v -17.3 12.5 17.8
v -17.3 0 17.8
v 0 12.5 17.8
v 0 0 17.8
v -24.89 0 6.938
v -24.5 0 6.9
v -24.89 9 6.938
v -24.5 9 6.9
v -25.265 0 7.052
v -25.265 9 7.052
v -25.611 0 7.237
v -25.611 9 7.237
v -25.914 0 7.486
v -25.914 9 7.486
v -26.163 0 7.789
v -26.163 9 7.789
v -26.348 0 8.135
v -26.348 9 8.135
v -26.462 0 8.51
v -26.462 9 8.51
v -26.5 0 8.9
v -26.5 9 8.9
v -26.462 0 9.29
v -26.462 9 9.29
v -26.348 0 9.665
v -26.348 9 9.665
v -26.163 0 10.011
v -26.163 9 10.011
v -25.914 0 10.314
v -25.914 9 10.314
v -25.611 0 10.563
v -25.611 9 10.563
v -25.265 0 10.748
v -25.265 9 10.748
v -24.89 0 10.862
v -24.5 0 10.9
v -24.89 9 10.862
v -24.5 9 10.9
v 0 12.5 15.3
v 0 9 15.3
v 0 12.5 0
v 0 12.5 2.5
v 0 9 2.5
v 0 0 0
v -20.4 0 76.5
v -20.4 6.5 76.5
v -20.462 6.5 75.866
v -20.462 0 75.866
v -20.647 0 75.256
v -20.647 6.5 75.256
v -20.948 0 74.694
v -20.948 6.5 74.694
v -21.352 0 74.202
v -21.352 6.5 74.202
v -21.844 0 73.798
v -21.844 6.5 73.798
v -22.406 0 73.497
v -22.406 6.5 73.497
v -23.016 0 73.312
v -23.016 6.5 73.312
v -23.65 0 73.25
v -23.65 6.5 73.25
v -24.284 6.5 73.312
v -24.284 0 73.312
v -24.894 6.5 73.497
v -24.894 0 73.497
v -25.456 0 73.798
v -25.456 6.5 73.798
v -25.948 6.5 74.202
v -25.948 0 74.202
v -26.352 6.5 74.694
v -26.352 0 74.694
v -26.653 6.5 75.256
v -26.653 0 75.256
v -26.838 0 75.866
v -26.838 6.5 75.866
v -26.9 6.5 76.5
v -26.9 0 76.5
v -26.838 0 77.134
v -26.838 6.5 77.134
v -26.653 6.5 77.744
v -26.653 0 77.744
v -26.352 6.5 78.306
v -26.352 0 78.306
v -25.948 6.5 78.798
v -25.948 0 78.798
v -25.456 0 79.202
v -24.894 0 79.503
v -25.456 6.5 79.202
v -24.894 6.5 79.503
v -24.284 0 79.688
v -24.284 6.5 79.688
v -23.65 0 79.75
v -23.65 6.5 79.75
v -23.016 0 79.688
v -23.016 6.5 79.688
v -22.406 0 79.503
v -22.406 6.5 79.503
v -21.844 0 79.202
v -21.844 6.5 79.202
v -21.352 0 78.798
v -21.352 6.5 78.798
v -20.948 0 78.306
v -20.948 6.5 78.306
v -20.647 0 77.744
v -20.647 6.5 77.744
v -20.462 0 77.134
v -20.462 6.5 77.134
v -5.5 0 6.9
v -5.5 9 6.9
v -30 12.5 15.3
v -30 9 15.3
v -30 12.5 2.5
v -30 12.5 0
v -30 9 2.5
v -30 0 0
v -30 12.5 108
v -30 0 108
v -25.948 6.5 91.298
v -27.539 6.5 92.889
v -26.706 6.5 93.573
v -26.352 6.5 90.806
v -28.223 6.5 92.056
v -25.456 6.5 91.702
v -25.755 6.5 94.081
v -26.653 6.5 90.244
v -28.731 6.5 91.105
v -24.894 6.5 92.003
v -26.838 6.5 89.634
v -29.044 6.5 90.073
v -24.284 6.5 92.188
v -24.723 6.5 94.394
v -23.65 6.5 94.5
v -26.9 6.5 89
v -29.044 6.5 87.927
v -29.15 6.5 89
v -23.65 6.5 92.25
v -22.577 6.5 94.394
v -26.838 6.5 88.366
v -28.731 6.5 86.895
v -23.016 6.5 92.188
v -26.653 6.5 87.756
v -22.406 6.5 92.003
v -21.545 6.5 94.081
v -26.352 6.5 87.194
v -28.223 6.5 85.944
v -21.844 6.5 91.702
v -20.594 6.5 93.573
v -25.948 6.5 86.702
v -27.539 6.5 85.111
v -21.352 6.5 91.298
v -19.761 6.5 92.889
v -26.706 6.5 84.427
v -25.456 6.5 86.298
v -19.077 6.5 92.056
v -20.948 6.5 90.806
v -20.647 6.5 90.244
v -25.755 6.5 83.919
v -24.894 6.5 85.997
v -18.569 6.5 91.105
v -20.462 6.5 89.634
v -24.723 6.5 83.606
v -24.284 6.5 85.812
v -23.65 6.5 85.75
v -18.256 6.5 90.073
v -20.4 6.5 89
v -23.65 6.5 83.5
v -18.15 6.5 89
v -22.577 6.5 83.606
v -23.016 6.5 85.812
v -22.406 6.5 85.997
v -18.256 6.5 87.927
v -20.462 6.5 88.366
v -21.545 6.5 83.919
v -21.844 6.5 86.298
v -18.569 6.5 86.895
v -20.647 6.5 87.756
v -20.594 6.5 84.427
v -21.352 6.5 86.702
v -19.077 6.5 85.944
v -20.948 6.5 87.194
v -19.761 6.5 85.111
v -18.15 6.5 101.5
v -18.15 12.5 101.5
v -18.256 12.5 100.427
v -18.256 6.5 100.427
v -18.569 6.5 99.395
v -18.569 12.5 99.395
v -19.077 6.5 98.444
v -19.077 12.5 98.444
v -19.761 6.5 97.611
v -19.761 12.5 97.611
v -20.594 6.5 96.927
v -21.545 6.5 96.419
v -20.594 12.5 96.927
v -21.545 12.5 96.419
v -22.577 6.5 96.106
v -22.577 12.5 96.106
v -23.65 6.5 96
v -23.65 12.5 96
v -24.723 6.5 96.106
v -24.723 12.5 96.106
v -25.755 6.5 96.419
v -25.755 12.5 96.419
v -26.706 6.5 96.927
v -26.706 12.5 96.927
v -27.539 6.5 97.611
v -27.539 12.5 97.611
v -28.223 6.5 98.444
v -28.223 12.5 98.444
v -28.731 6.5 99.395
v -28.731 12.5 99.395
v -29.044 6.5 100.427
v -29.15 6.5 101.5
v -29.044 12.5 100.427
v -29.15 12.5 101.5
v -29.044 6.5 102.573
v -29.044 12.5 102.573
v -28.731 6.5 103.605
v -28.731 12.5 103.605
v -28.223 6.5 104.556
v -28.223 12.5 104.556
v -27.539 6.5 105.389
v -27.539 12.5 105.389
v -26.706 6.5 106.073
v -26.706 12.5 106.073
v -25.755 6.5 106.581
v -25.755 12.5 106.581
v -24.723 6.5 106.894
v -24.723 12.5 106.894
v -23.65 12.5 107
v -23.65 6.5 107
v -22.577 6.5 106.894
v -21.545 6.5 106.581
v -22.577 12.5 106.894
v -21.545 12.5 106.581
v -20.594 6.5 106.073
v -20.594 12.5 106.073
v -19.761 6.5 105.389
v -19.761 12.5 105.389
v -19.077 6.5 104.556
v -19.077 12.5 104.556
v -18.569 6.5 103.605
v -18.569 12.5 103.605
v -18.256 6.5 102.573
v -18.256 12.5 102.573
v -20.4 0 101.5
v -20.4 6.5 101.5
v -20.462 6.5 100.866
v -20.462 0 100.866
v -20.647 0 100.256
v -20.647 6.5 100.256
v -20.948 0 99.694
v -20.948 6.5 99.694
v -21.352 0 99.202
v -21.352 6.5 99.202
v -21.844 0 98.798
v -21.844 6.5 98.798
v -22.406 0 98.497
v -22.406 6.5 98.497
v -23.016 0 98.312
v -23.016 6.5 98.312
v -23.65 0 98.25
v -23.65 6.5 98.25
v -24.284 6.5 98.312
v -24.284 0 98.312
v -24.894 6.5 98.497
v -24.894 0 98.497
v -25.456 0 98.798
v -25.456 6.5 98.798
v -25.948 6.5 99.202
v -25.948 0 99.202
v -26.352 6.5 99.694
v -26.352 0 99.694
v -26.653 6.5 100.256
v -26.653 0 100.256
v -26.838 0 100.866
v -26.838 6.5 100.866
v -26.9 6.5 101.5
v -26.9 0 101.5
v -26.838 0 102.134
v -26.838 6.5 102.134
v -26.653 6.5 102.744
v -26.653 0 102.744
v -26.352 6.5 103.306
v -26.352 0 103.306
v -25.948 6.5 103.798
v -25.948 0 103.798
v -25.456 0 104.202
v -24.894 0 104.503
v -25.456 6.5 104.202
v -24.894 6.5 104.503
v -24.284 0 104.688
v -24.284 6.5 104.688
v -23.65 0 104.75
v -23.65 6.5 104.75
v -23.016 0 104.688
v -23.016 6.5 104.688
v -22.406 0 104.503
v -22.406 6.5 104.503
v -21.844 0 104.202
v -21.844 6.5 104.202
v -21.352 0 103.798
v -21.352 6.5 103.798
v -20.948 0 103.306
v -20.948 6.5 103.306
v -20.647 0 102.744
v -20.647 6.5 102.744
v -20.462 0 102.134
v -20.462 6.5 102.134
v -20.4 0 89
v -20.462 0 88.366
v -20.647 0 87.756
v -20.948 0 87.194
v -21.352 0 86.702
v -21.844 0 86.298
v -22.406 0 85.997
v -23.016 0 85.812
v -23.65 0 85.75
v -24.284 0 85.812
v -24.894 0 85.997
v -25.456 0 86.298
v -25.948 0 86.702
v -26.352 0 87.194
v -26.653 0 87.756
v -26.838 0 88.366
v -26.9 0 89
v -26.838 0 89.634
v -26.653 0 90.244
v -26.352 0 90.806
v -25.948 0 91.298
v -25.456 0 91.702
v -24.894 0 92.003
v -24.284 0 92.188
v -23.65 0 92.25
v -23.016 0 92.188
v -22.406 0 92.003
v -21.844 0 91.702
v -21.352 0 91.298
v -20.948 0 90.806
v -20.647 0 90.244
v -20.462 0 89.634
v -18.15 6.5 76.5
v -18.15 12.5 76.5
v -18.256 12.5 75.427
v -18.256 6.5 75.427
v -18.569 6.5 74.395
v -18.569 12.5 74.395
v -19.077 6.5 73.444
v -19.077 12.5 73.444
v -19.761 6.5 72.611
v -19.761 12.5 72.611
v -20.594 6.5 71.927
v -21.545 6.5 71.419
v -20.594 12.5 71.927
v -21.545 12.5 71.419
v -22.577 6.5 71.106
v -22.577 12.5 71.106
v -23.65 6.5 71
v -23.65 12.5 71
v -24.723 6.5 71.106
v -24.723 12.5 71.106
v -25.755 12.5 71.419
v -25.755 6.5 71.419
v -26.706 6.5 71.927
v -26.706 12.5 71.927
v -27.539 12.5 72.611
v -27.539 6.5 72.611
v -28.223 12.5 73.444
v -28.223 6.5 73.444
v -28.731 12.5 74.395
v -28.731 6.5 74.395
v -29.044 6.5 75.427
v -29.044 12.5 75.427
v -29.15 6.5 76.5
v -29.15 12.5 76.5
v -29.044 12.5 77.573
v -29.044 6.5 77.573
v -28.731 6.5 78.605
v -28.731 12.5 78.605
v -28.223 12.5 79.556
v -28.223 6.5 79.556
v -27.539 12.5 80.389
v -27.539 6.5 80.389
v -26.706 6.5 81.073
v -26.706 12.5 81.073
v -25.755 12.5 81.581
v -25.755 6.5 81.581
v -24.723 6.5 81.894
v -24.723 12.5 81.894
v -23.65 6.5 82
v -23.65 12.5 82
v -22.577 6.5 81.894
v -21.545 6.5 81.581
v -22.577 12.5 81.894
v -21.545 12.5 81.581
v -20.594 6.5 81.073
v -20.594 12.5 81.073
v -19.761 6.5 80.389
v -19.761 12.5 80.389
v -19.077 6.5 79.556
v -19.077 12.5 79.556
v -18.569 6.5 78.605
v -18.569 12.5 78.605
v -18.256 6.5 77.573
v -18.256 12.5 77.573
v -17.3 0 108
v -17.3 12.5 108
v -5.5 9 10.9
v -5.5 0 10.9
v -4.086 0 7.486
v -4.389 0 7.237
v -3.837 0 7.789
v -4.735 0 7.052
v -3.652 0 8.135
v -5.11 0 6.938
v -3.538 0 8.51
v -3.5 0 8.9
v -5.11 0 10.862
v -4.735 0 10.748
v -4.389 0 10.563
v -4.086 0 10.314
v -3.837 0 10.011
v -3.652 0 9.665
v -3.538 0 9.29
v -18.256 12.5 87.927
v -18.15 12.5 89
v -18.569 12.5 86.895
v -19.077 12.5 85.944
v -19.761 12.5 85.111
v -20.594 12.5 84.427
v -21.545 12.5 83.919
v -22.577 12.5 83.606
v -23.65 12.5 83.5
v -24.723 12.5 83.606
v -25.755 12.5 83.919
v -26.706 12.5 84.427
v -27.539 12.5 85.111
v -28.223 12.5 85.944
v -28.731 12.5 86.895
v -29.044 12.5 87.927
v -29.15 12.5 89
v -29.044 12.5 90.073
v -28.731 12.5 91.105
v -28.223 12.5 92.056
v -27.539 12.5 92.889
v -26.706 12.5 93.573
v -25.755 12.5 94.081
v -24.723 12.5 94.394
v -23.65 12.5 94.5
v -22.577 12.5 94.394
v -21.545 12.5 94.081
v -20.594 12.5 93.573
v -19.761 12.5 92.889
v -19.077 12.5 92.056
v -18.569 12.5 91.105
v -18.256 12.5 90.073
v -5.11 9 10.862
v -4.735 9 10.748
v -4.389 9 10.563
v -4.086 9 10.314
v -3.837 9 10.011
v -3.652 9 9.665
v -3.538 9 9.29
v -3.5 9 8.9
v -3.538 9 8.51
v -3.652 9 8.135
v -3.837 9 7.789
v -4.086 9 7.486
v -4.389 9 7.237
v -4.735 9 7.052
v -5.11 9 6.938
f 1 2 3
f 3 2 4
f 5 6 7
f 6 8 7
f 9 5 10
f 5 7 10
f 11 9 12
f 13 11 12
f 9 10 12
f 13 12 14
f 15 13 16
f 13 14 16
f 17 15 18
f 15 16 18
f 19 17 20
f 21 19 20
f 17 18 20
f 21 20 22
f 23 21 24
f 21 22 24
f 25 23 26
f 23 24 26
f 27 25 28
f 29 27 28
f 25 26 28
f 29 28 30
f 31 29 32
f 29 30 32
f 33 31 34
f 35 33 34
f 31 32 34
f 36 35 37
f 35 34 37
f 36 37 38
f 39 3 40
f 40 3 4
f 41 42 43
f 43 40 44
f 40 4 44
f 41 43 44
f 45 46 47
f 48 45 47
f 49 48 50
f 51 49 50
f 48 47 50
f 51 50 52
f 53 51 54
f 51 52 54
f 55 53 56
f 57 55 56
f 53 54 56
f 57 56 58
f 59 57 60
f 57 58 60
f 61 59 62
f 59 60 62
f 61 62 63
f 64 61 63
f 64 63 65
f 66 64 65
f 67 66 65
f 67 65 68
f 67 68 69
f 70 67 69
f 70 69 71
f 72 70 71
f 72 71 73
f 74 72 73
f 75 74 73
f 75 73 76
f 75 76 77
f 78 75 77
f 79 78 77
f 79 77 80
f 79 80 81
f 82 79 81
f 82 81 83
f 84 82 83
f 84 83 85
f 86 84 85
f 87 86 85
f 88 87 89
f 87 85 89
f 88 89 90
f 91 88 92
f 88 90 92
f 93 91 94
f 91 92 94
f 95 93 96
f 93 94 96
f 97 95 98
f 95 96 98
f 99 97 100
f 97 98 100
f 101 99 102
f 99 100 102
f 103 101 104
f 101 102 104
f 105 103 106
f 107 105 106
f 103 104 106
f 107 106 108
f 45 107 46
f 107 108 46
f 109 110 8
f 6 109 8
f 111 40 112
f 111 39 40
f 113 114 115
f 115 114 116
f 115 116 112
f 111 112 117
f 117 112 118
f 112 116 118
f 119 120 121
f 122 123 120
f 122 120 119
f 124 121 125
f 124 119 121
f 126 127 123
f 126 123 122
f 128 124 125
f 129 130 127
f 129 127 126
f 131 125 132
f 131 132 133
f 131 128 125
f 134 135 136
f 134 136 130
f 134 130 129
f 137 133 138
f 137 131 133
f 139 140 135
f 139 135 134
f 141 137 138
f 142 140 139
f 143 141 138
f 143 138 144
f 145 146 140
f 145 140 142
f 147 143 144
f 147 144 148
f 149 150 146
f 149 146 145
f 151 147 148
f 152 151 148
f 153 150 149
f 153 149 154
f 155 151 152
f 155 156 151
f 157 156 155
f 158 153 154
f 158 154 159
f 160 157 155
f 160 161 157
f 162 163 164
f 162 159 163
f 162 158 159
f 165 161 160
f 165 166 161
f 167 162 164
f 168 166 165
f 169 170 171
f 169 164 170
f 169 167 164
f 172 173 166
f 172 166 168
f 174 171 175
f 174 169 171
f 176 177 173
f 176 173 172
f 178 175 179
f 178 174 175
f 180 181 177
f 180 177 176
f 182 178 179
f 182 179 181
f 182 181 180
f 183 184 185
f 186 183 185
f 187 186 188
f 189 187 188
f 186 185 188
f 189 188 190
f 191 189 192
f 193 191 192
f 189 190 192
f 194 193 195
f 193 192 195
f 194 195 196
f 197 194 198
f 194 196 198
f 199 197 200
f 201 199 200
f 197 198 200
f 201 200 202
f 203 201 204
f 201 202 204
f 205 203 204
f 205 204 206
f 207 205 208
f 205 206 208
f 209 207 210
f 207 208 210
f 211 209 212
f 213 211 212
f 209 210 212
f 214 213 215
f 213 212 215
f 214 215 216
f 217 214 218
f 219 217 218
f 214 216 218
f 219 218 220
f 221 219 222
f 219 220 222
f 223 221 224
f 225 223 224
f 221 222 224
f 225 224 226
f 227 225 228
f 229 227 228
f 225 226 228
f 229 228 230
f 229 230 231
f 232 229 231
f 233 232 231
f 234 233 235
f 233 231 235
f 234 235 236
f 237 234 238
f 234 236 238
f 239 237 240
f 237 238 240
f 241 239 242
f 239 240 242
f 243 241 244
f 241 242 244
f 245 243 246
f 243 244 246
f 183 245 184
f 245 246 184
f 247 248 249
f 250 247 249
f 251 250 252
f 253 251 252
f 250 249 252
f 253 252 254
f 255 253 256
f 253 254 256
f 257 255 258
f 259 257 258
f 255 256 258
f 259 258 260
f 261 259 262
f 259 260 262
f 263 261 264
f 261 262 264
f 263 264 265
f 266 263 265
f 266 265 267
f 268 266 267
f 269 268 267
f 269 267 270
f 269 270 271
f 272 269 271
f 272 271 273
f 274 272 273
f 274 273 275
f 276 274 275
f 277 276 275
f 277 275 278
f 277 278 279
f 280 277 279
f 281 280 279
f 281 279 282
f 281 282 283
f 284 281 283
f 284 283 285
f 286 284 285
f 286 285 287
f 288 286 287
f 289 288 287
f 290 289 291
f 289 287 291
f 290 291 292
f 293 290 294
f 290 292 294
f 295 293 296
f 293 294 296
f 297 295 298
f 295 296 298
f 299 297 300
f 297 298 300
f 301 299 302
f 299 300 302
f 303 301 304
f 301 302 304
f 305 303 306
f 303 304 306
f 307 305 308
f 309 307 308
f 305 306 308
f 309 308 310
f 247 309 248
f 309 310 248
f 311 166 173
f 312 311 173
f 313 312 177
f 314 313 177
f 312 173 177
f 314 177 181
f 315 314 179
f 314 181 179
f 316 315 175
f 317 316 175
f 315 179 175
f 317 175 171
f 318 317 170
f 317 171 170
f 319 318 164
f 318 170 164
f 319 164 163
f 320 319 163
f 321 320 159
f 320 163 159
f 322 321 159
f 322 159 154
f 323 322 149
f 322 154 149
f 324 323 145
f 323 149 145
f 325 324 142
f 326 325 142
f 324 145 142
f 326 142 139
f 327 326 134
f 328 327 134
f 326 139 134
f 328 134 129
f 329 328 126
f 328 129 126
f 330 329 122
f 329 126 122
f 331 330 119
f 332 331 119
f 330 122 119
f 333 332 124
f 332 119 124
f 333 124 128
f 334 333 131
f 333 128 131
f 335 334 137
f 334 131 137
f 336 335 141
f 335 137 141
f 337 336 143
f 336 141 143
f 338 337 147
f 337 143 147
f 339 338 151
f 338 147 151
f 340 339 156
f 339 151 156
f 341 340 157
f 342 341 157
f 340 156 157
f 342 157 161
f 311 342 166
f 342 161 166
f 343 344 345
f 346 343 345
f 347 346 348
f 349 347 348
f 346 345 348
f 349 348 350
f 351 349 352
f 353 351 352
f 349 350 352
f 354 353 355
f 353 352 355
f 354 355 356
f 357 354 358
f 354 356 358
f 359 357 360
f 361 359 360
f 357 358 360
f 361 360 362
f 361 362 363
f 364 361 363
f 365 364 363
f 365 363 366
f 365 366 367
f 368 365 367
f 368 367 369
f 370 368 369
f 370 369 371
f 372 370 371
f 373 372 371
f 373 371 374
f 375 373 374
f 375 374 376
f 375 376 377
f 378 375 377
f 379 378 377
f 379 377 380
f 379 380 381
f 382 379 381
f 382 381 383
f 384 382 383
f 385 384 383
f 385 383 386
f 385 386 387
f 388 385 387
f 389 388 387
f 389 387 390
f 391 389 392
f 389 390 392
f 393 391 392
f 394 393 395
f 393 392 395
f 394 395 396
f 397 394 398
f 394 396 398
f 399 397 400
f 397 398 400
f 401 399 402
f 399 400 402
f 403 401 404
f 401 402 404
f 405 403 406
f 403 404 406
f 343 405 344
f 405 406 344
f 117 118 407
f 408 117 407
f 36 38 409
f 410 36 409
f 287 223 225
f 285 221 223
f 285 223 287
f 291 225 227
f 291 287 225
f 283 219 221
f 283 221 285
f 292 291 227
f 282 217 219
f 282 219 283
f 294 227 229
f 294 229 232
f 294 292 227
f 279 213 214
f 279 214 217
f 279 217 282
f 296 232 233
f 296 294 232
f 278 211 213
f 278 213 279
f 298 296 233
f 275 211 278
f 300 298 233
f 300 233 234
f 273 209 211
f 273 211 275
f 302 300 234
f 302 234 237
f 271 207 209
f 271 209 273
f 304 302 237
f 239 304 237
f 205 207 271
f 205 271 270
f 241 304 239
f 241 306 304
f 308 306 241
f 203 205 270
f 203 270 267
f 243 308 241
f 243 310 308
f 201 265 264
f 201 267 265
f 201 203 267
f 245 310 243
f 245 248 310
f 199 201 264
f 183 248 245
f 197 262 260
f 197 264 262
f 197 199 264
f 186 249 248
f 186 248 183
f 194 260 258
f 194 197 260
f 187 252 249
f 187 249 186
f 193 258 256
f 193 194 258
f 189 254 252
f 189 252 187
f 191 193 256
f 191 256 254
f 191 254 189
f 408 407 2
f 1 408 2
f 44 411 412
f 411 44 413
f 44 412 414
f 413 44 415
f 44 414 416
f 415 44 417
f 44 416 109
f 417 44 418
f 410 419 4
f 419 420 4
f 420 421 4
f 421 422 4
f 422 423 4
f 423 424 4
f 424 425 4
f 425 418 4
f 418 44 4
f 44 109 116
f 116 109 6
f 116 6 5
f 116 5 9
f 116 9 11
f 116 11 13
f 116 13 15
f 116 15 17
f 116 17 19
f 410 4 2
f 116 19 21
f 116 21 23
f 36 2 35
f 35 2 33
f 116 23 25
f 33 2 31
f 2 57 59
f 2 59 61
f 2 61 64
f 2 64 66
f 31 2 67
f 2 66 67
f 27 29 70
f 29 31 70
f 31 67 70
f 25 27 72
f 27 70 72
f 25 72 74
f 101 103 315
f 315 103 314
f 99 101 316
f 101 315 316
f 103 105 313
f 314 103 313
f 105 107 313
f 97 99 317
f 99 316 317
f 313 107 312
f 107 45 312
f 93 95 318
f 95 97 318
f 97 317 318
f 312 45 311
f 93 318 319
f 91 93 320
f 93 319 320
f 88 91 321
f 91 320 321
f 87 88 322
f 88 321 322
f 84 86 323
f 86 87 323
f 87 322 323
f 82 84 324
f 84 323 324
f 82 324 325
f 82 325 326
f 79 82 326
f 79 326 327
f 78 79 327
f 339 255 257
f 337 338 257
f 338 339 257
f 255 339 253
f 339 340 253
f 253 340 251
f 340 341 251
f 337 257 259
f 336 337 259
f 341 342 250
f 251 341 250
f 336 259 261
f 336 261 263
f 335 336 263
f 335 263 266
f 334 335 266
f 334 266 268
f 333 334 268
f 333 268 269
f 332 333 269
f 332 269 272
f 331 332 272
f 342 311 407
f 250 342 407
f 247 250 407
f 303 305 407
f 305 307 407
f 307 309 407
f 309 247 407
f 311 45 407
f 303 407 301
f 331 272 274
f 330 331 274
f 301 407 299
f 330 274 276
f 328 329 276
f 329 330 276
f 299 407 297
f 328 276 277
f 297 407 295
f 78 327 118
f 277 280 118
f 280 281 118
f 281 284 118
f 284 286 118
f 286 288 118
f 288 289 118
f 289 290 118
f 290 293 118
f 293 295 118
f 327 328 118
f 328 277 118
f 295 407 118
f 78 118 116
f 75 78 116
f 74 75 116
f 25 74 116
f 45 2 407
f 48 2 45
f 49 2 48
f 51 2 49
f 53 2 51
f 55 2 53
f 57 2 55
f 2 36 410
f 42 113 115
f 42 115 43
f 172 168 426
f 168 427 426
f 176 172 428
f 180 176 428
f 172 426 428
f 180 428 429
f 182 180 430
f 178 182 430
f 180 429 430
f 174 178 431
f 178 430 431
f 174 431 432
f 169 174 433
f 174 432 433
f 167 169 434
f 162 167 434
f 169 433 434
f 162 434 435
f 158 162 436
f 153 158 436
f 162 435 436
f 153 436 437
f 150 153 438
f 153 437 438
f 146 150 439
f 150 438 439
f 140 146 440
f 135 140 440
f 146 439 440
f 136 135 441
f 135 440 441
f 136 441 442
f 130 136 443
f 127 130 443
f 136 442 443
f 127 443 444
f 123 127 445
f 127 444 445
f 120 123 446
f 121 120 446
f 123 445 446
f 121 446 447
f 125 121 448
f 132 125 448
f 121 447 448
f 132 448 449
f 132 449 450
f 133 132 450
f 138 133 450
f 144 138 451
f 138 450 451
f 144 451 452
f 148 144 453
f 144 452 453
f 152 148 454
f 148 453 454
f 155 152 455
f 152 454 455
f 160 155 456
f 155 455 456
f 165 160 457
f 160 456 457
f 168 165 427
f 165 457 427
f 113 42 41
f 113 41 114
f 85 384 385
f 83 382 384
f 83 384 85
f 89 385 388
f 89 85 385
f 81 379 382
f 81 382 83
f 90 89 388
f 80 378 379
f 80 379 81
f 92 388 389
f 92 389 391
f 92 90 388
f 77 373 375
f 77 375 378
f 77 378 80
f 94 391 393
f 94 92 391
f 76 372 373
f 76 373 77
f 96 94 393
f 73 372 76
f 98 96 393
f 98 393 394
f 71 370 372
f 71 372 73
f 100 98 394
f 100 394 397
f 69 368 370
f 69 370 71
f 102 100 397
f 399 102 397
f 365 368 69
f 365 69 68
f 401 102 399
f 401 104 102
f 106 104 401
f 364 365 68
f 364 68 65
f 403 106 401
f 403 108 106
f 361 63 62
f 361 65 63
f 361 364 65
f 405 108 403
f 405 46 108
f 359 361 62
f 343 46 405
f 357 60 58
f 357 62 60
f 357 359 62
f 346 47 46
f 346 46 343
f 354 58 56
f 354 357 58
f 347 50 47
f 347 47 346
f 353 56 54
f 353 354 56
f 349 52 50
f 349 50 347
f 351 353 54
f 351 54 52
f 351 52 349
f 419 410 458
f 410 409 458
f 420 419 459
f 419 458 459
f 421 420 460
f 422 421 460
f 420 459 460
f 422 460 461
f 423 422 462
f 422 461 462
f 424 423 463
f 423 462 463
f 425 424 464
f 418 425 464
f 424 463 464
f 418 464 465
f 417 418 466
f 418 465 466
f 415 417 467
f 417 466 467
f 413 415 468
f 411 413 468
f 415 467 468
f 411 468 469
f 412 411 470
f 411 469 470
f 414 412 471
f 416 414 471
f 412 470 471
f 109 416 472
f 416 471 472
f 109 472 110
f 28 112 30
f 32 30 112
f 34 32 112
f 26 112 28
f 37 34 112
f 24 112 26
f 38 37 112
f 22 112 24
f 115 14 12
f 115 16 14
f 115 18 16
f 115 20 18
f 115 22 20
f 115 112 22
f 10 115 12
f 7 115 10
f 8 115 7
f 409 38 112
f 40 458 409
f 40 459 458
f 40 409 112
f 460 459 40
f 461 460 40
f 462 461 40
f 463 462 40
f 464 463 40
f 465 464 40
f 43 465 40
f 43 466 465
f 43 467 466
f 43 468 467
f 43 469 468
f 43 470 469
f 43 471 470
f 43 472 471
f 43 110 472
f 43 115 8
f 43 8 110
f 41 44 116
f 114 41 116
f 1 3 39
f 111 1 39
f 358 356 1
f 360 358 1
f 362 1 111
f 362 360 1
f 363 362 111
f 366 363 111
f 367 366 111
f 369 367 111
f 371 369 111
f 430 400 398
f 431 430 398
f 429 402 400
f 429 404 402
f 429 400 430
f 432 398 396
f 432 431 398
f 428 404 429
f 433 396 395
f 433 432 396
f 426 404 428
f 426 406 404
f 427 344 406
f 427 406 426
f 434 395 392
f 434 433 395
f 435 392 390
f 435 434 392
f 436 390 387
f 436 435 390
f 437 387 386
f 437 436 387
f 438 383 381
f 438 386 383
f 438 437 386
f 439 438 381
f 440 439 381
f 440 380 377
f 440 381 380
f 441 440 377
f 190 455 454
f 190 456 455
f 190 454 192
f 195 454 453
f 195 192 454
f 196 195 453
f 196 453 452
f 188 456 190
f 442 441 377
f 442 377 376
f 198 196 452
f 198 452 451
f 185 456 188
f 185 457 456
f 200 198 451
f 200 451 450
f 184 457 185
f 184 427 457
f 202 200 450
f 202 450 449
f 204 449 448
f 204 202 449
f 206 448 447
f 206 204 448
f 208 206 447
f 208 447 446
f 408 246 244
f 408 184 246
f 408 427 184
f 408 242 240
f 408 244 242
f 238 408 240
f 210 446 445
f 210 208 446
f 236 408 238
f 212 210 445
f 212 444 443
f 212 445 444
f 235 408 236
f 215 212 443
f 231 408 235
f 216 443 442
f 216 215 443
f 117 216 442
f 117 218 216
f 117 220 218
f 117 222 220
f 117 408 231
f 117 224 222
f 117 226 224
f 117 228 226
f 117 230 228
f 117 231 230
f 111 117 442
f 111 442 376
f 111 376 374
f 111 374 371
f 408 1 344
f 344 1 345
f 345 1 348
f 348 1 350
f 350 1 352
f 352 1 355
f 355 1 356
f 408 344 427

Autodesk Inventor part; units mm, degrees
ref_plane "YZ Plane" through (0, 0, 0) normal (1, 0, 0) x (0, 1, 0)
ref_plane "XZ Plane" through (0, 0, 0) normal (0, 1, 0) x (-1, 0, 0)
ref_plane "XY Plane" through (0, 0, 0) normal (0, 0, 1) x (1, 0, 0)
sketch "Sketch1" plane through (0, 0, 0) normal (0, 1, 0) x (-1, 0, 0)
  line L0 (0, 0) -> (30, 0)
  line L1 (30, 0) -> (30, 108)
  line L2 (30, 108) -> (17.3, 108)
  line L3 (17.3, 108) -> (17.3, 17.8)
  line L4 (17.3, 17.8) -> (0, 17.8)
  line L5 (0, 17.8) -> (0, 0)
  dimension "d0" = 30
  dimension "d1" = 108
  dimension "d2" = 12.7
  dimension "d3" = 90.2
extrude "Extrusion1" add sketch "Sketch1" along normal blind 12.5
sketch "Sketch2" plane through (0, 12.5, 0) normal (0, 1, 0) x (1, 0, 0)
  line L0 (0, -17.8) -> (0, 0) projected
  line L1 (-30, 0) -> (-30, -108) projected
  line L2 (-30, 0) -> (-30, -108) projected
  line L3 (0, -15.3) -> (-30, -15.3)
  line L4 (-30, -15.3) -> (-30, -2.5)
  line L5 (-30, -2.5) -> (0, -2.5)
  line L6 (0, -2.5) -> (0, -15.3)
  dimension "d6" = 12.8
extrude "Extrusion2" cut sketch "Sketch2" against normal blind 3.5
sketch "Sketch3" plane through (0, 9, 0) normal (0, 1, 0) x (1, 0, 0)
  line L0 (-30, -8.9) -> (0, -8.9) construction
  line L1 (0, -17.8) -> (0, 0) projected
  arc A0 (-5.5, -10.9) -> (-5.5, -6.9) centre (-5.5, -8.9) ccw
  arc A1 (-24.5, -6.9) -> (-24.5, -10.9) centre (-24.5, -8.9) ccw
  line L2 (-24.5, -10.9) -> (-5.5, -10.9)
  line L3 (-5.5, -6.9) -> (-24.5, -6.9)
  dimension "d9" = 4
  dimension "d10" = 4
extrude "Extrusion3" cut sketch "Sketch3" against normal through all
sketch "Sketch4" plane through (0, 12.5, 0) normal (0, 1, 0) x (1, 0, 0)
  line L0 (-30, -108) -> (-17.3, -108) projected
  line L1 (-23.65, -108) -> (-23.65, -15.5103) construction
  circle A0 centre (-23.65, -101.5) radius 5.5
  circle A1 centre (-23.65, -89) radius 5.5
  circle A2 centre (-23.65, -76.5) radius 5.5
  circle A3 centre (-23.65, -76.5) radius 3.25
  circle A4 centre (-23.65, -89) radius 3.25
  circle A5 centre (-23.65, -101.5) radius 3.25
  point P0 (0, 0)
  dimension "d13" = 11
  dimension "d14" = 11
  dimension "d15" = 11
  dimension "d16" = 12.5
  dimension "d17" = 12.5
  dimension "d18" = 6.5
  dimension "d19" = 6.5
  dimension "d20" = 6.5
  dimension "d25" = 6.5
extrude "Extrusion4" cut sketch "Sketch4" against normal through all contours A3 | A4 | A5
extrude "Extrusion5" cut sketch "Sketch4" against normal blind 6
properties part number "HeadbarHolder" material "Aluminum 6061"
